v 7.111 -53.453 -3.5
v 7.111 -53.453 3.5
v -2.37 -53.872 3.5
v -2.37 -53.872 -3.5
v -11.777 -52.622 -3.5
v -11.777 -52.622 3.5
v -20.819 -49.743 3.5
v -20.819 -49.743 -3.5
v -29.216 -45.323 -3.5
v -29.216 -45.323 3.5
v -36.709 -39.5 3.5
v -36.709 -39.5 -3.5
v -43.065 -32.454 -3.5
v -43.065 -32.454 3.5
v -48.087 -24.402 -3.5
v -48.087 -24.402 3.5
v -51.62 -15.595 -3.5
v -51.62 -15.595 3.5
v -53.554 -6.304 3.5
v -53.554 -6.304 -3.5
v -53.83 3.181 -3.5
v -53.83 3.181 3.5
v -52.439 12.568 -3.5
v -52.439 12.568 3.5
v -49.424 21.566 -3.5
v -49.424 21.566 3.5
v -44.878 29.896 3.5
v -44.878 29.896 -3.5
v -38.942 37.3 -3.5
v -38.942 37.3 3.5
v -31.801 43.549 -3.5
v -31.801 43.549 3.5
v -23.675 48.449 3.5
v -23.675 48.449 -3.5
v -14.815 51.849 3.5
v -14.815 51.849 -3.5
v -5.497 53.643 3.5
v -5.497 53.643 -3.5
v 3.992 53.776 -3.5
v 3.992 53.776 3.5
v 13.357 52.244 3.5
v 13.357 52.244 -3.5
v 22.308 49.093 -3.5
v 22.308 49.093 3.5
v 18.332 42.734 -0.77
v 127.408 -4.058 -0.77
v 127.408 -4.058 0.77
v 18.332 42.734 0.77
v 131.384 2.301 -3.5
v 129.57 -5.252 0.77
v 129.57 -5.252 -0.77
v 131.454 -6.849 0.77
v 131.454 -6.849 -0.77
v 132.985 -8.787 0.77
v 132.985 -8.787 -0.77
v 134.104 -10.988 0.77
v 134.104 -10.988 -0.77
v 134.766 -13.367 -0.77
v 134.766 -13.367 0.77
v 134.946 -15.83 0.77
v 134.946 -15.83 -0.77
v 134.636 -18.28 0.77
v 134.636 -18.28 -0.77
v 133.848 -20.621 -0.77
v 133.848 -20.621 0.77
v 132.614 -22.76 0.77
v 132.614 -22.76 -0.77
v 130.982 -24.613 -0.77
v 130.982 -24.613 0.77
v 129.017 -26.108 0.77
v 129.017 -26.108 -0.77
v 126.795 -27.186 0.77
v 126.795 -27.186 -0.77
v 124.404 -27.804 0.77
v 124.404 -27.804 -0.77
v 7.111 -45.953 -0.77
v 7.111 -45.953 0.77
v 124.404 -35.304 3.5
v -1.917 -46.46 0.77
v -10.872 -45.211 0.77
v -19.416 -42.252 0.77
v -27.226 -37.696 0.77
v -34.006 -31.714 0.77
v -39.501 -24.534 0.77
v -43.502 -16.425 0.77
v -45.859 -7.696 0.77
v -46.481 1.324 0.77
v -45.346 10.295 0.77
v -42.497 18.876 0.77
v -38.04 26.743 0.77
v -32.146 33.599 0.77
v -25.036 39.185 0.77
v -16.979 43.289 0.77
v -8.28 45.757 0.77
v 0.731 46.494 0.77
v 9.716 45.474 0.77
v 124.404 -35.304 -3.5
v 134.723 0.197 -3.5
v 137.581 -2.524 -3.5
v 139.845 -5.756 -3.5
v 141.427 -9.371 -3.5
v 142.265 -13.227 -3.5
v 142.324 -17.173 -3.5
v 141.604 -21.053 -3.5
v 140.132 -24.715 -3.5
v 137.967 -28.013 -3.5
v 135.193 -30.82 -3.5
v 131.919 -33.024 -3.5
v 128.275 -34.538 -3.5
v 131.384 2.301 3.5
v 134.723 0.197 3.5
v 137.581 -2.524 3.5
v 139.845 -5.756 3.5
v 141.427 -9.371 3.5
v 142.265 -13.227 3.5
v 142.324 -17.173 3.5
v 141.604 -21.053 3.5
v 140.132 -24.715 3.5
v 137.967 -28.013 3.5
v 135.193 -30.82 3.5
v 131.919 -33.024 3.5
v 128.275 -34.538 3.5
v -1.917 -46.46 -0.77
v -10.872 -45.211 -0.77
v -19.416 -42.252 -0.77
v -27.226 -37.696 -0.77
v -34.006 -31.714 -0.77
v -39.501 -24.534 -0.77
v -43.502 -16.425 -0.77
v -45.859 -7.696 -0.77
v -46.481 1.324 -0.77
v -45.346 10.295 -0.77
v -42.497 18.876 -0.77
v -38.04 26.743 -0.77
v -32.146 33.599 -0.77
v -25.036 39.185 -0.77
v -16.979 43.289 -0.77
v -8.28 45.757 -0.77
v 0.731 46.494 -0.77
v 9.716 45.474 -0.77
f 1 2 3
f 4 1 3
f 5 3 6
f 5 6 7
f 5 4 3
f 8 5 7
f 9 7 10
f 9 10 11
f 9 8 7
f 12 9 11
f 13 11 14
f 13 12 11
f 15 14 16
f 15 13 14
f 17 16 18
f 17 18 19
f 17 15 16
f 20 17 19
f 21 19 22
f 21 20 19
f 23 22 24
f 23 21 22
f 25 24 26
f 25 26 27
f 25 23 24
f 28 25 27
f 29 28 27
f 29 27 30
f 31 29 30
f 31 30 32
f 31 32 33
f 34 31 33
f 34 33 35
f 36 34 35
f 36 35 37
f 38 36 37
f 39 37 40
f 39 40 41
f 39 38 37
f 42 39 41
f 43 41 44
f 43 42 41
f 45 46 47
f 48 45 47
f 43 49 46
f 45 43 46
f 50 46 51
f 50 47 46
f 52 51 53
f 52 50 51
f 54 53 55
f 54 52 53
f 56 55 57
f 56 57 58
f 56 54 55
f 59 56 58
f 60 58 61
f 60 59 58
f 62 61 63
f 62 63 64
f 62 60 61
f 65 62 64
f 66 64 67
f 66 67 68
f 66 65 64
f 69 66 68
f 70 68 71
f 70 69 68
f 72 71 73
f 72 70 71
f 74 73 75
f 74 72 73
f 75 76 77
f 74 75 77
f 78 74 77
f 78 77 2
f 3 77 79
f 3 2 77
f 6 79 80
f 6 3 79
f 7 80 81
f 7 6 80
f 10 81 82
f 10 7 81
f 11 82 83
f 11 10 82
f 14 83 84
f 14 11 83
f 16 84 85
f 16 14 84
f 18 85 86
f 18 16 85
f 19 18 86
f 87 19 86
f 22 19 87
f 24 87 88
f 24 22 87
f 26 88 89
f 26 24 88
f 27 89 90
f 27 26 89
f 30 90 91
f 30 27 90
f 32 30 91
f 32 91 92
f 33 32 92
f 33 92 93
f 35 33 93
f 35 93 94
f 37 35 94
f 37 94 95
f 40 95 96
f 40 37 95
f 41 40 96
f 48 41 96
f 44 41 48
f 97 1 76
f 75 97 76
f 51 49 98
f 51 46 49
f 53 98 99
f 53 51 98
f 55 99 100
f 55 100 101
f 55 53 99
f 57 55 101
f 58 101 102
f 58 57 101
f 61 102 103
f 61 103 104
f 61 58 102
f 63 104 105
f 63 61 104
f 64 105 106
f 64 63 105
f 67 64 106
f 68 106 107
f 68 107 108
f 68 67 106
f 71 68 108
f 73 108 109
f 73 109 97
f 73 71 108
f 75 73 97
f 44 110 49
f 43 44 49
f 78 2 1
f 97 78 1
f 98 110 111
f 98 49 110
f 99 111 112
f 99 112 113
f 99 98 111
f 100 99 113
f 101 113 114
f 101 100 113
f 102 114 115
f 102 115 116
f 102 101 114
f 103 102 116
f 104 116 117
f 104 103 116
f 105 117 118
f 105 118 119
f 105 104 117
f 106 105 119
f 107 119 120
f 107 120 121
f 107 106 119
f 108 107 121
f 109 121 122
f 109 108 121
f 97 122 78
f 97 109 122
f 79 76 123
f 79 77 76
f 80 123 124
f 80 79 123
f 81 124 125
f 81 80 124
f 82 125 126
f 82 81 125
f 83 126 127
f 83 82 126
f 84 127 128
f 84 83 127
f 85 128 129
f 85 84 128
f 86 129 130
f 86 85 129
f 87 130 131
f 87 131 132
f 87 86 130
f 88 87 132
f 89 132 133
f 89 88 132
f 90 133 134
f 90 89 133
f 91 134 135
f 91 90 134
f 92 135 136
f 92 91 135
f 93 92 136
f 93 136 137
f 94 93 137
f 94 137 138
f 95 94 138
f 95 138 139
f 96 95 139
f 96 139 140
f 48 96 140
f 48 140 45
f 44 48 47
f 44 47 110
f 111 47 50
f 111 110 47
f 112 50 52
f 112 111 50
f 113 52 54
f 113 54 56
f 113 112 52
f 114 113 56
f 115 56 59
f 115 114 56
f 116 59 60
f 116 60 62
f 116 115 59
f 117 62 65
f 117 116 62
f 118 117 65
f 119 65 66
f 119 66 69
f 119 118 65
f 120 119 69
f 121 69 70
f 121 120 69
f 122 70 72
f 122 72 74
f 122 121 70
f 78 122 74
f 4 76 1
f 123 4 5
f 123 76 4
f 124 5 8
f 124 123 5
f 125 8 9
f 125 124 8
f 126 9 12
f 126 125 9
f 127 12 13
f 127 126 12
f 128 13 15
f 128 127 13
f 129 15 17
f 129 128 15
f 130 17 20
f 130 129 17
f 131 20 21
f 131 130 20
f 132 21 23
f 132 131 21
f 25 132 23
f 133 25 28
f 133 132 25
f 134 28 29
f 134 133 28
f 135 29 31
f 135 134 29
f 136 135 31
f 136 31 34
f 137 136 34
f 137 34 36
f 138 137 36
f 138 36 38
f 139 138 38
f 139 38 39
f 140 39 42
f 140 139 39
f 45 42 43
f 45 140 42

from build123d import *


with BuildPart() as part:
    # Sweep1: sweep along a path in Sketch1
    with BuildLine(Plane.XY) as sweep1_path:
        Line((18.332237974, 42.733816245), (127.408308877, -4.058365328))
        ThreePointArc((127.408308877, -4.058365328), (134.851518724, -17.062845226), (124.403812758, -27.803576593))
        Line((124.403812758, -27.803576593), (7.110625962, -45.953117396))
        ThreePointArc((7.110625962, -45.953117396), (-46.132178368, 5.837132773), (18.332237974, 42.733816245))
    # Sketch2 → Sweep1 (sweep)
    with BuildSketch(Plane(origin=(7.110625962, 0, 0), x_dir=(0, 0, -1), z_dir=(1, 0, 0))):
        Polygon((-0.770223243, -45.953117396), (0.770223243, -45.953117396), (3.5, -53.453117396), (-3.5, -53.453117396), align=None)
    sweep(path=sweep1_path.line)


solid = part.part
